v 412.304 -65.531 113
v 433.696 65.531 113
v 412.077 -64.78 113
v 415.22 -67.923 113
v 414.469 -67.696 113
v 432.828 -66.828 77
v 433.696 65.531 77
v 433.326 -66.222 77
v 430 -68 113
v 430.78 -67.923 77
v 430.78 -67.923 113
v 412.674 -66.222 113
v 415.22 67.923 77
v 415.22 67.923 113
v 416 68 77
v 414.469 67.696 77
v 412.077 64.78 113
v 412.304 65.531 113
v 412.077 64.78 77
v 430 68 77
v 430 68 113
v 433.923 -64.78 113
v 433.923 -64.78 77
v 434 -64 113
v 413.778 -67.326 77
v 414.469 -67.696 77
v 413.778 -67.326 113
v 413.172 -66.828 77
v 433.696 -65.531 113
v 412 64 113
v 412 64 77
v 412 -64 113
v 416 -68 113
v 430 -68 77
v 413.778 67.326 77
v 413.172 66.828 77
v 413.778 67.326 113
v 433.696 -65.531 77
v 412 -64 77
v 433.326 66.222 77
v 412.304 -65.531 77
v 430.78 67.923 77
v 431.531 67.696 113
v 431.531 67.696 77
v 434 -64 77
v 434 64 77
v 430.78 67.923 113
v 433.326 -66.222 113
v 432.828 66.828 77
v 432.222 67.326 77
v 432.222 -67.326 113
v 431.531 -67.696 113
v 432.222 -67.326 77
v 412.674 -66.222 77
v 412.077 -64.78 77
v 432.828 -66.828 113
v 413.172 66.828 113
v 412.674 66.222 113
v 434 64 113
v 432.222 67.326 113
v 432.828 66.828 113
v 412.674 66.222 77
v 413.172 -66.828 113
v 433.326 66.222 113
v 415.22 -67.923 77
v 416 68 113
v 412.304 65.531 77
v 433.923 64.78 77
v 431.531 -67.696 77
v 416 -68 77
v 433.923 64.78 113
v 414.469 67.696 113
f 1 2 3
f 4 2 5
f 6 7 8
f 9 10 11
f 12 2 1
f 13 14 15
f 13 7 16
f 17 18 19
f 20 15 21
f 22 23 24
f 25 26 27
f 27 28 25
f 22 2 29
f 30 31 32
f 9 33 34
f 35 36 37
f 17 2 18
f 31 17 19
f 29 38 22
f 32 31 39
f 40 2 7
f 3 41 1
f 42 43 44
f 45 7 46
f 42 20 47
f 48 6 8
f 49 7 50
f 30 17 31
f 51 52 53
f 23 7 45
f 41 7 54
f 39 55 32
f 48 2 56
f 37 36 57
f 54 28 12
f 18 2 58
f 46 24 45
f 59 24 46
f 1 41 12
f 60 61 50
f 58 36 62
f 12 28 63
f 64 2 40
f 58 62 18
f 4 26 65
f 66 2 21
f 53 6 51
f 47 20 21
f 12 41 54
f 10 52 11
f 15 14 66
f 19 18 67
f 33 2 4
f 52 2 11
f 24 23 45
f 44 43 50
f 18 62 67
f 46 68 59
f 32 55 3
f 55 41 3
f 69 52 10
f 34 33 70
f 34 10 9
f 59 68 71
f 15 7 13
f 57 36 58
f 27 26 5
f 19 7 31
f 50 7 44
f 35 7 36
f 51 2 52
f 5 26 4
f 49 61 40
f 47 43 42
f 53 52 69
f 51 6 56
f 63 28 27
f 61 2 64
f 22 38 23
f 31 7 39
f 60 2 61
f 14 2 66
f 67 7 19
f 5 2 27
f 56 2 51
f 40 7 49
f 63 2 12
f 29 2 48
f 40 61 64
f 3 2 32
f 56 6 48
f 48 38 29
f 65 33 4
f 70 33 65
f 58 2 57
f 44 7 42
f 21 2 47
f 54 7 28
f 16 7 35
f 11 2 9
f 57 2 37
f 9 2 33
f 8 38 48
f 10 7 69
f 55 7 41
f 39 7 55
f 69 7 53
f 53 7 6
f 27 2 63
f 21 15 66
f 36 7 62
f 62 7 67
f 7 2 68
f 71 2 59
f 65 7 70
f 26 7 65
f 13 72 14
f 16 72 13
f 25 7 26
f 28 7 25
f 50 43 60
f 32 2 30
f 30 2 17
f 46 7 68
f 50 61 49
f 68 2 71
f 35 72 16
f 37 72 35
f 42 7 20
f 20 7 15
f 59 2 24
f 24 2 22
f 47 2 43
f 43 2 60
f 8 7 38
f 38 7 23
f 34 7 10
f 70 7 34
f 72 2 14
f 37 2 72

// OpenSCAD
export_only = true;
include <main.scad>
charging_contacts_housing();
